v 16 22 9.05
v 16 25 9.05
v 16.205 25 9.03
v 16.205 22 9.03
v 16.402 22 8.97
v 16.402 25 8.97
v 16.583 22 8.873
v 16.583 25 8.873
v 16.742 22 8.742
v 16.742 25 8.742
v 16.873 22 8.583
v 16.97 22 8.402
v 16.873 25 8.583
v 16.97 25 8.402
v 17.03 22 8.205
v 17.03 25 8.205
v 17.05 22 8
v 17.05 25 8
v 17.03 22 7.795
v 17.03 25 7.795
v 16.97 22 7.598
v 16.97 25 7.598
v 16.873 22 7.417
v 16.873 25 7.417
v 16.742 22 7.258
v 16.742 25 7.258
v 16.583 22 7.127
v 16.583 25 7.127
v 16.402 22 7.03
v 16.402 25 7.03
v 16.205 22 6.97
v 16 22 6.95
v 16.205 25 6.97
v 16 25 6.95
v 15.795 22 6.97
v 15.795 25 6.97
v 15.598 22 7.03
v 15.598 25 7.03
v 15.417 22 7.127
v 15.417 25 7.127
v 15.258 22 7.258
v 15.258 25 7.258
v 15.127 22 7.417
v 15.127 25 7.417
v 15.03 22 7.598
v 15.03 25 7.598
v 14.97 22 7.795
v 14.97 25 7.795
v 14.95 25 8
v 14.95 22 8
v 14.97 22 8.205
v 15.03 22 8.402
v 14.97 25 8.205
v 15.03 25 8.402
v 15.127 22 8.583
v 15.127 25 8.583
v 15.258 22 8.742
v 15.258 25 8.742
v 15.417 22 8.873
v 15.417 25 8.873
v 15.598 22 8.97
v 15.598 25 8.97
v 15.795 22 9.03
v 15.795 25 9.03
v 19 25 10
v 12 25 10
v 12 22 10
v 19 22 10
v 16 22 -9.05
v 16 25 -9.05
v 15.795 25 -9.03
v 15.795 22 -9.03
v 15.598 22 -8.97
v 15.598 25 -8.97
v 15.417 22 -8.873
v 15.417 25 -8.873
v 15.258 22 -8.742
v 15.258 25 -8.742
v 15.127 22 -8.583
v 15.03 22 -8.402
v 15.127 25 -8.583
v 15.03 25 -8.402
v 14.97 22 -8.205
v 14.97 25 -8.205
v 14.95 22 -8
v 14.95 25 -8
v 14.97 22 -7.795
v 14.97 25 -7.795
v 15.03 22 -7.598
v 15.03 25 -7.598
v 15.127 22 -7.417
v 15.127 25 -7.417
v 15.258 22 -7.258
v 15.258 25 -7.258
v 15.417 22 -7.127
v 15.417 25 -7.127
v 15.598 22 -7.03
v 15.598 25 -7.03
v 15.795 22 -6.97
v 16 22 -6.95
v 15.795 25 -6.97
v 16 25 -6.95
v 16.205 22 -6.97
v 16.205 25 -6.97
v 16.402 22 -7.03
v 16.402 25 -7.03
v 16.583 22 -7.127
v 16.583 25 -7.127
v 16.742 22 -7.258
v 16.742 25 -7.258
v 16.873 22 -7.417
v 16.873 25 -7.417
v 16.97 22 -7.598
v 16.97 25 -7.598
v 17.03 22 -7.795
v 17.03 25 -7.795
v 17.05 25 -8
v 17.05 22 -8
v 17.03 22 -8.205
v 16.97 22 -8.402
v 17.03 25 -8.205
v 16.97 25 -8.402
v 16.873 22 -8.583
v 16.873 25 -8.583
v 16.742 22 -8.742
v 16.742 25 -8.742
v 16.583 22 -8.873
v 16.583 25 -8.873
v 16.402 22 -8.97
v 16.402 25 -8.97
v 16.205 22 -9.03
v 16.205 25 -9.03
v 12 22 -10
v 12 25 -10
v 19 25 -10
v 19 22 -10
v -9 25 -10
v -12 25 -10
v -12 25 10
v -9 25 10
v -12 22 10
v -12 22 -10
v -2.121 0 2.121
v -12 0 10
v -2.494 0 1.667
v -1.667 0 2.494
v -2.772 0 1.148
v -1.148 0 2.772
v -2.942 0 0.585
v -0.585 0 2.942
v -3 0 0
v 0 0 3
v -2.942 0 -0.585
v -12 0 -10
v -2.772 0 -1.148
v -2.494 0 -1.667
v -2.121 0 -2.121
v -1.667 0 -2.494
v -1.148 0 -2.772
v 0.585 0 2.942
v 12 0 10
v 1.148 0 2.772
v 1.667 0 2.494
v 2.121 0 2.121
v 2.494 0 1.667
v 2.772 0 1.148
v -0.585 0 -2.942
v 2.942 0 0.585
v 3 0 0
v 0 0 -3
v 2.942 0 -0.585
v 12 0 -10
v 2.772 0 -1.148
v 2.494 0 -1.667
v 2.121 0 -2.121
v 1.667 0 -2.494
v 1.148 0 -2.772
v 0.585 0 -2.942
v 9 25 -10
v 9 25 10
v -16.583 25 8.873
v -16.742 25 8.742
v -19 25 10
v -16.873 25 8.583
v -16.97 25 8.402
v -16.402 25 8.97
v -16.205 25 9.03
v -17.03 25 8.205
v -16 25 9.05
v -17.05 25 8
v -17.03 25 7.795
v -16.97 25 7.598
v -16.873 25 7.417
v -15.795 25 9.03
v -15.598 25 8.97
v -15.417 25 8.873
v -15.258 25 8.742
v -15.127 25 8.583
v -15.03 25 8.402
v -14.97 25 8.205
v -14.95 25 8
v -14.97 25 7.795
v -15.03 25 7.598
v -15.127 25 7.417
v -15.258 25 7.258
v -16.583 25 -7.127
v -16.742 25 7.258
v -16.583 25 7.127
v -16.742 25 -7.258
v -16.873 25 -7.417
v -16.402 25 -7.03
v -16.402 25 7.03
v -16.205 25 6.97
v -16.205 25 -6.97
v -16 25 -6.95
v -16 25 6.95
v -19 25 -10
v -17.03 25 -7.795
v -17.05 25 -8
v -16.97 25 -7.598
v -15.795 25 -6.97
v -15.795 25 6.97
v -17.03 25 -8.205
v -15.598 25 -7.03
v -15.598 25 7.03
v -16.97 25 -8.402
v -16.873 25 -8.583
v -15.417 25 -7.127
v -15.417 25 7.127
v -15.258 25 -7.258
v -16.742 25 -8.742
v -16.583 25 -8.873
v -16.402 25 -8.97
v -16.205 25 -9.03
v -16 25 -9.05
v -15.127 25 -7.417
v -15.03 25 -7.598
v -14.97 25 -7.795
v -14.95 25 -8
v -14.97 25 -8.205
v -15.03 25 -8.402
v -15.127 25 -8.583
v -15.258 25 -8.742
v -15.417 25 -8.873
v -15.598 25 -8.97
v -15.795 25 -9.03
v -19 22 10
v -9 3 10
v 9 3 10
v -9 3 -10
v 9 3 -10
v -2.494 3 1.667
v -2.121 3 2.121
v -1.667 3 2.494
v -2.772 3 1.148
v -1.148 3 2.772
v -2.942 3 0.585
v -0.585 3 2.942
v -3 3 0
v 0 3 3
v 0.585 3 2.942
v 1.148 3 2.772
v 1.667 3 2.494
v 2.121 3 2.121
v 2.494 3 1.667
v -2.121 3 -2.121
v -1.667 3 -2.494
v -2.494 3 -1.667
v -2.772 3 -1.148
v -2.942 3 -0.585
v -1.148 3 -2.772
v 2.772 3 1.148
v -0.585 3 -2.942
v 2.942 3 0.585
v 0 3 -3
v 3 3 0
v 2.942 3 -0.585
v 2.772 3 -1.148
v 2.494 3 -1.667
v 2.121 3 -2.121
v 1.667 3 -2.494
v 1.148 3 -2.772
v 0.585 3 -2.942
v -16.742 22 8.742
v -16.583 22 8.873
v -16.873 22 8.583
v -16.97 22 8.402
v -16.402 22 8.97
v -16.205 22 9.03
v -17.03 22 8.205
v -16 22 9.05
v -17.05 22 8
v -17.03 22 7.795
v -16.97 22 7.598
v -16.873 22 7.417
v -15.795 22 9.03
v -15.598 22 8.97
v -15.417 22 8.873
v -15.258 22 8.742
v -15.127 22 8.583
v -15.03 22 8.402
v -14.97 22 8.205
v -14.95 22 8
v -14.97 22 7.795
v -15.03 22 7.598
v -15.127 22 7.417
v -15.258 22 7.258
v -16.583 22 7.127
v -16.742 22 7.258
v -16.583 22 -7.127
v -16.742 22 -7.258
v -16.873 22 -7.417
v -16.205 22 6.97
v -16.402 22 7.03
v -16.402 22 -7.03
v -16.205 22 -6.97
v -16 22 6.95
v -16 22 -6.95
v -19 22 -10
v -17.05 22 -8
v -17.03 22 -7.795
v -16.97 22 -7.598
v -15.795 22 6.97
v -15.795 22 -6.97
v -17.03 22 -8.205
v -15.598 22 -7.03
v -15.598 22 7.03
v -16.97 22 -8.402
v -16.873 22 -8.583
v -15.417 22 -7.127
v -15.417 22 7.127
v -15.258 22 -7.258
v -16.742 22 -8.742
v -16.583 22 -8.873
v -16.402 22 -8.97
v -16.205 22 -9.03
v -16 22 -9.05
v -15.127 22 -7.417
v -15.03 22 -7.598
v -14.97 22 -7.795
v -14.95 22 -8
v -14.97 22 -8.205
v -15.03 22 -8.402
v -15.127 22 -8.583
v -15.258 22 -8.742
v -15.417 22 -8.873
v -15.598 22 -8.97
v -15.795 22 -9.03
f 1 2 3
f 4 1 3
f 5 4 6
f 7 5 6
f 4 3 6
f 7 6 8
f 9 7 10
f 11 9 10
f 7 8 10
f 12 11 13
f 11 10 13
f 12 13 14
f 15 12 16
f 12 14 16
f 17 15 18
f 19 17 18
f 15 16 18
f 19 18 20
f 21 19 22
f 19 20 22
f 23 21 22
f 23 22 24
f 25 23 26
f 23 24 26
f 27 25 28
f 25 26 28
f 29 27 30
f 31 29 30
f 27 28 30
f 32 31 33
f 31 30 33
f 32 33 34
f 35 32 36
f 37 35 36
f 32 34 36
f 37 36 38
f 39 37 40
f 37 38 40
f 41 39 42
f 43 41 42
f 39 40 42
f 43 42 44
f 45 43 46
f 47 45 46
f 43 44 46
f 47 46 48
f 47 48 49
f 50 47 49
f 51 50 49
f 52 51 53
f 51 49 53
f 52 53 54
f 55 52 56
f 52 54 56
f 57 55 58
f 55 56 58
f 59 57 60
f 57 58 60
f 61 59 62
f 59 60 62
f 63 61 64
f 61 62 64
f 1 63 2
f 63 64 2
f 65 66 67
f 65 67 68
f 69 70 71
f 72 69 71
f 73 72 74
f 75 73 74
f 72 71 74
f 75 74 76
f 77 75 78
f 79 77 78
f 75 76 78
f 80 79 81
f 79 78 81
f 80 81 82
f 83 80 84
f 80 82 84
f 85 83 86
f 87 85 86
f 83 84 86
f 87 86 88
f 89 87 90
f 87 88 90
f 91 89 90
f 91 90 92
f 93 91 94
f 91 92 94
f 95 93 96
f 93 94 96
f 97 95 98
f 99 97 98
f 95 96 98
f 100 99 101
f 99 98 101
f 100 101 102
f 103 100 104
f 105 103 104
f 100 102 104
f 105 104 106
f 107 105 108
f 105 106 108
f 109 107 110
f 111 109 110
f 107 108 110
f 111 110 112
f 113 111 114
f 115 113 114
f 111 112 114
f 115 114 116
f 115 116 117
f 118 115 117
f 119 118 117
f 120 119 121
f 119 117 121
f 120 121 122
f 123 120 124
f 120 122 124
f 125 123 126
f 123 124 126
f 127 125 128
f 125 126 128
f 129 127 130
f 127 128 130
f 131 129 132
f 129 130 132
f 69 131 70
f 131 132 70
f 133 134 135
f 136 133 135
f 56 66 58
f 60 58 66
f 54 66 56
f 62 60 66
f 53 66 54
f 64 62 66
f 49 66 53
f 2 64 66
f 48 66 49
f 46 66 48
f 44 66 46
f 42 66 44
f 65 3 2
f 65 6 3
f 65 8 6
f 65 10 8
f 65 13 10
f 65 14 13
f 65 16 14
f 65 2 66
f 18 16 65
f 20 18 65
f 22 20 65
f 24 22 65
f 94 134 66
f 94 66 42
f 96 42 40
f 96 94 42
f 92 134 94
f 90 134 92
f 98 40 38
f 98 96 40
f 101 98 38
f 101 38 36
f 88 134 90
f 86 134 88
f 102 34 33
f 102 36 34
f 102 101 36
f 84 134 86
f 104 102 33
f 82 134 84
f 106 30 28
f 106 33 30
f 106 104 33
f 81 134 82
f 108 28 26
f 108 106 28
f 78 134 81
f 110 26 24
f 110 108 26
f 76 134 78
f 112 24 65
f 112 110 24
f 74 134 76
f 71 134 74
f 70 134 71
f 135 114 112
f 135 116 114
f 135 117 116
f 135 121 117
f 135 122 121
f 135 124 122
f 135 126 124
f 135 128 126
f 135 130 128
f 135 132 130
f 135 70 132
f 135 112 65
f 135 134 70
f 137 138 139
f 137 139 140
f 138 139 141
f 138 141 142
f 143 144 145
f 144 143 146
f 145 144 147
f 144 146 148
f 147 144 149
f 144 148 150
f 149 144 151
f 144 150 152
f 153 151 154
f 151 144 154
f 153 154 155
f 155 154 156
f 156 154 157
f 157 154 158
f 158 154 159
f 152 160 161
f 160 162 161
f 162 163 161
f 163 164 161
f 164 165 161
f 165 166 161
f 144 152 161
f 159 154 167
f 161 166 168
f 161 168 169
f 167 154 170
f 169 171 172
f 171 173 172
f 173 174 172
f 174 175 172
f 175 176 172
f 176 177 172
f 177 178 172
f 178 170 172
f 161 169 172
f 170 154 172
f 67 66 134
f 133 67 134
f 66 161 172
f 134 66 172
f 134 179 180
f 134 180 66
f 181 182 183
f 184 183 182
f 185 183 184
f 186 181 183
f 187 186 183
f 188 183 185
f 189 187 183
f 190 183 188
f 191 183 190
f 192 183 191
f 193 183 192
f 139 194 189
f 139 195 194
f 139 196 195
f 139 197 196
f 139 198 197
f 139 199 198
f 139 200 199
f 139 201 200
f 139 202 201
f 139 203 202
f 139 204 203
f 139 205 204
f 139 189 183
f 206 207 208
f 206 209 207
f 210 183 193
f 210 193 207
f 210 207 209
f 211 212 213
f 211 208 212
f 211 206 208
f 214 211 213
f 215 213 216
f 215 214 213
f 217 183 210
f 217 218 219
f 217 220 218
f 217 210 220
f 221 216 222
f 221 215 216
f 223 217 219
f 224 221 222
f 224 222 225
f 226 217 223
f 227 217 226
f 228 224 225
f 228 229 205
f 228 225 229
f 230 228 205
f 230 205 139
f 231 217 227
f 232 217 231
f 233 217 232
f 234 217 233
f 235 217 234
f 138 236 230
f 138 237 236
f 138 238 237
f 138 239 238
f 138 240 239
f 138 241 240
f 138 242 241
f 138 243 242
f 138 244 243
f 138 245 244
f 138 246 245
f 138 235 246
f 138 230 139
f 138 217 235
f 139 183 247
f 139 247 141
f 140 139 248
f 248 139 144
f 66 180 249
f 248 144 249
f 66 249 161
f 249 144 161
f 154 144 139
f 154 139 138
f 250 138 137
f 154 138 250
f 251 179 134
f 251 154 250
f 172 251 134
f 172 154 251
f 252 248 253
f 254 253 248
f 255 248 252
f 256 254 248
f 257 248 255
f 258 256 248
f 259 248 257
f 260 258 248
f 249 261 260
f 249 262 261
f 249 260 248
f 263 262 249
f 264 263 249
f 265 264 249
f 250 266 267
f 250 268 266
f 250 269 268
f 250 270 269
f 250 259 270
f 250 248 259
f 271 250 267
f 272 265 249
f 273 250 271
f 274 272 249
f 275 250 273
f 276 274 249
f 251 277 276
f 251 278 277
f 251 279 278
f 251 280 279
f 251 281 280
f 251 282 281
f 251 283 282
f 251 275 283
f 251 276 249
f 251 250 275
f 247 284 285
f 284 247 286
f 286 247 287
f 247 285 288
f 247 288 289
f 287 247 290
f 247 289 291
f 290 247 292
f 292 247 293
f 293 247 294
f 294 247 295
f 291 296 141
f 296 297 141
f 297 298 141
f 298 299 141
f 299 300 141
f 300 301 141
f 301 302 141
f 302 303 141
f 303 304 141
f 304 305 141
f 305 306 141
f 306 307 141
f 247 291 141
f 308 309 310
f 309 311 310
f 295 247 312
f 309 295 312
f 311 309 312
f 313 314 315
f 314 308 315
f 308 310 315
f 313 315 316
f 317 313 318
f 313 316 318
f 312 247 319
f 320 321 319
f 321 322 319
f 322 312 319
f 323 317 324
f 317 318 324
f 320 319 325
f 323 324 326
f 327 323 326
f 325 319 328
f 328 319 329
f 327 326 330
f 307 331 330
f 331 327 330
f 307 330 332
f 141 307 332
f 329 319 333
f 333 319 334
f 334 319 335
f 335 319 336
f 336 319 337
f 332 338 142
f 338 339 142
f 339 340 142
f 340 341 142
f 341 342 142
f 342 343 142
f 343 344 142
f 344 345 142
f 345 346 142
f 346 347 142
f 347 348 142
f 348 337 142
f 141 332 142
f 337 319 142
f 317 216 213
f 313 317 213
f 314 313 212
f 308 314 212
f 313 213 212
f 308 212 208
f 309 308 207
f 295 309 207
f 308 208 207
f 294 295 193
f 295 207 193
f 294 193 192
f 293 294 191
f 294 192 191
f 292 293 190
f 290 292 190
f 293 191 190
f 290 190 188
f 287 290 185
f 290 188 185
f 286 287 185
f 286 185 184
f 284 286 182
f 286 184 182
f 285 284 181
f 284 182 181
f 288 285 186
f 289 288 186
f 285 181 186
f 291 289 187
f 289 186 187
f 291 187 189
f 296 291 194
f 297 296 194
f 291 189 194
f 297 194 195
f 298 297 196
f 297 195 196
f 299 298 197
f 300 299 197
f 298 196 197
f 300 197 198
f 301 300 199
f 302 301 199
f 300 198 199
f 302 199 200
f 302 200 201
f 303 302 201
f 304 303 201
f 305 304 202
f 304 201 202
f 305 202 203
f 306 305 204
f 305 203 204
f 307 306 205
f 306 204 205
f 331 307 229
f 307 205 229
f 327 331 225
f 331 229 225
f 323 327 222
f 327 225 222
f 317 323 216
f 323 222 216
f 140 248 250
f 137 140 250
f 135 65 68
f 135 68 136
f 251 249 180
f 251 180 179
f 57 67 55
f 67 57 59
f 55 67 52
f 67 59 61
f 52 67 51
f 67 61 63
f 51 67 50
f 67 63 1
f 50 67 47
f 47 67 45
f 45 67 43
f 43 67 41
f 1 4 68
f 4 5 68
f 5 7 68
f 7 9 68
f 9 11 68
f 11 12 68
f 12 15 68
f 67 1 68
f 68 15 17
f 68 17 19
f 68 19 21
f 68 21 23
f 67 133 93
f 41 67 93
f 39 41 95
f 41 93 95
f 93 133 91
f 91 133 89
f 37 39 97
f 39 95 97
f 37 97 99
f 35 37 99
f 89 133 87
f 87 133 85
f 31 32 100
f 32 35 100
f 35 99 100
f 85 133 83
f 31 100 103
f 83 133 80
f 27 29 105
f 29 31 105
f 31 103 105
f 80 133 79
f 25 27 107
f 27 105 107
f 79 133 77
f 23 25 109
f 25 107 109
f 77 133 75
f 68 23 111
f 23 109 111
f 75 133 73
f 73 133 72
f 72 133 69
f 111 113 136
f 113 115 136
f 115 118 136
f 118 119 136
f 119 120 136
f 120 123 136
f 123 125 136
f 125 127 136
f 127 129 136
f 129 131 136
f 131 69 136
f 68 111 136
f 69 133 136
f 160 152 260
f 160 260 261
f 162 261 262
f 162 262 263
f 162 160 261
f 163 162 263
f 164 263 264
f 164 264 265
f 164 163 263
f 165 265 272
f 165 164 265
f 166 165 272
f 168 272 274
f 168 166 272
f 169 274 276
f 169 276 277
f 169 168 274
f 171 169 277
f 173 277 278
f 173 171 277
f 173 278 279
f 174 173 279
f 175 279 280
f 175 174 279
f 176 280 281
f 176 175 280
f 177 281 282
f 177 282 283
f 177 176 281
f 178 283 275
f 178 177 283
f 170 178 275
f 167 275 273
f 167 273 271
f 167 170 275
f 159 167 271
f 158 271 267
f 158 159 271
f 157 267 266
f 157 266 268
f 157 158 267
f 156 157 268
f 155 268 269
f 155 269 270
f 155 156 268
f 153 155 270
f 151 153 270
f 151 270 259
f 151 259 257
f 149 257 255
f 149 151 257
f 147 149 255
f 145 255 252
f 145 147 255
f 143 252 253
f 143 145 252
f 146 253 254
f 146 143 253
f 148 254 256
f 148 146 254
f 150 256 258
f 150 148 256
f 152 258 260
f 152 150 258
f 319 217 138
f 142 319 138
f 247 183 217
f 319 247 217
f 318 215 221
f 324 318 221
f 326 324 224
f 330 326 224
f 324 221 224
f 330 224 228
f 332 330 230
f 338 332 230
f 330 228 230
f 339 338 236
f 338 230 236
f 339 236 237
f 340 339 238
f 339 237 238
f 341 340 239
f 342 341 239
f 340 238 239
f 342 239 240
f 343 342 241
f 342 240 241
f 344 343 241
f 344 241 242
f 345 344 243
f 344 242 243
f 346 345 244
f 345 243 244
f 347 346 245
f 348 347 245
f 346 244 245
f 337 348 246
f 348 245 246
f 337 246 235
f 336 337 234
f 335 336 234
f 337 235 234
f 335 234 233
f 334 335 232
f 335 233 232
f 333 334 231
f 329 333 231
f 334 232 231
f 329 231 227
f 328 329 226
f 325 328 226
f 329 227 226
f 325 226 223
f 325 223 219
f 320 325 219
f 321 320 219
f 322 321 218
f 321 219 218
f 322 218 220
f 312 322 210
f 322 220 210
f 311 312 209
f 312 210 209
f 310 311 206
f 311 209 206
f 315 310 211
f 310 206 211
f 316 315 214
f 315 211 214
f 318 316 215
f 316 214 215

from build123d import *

# Parameters (mm, degrees)
SKETCH_1_W        = 18
SKETCH_1_H        = 20
SKETCH_1_R        = 3
EXTRUDE_2_DEPTH   = 3
SKETCH_1_3_W      = 3
SKETCH_1_3_H      = 20
EXTRUDE_3_DEPTH   = 25
SKETCH_2_W        = 7
SKETCH_2_H        = 20
SKETCH_2_R        = 1.05
EXTRUDE_4_DEPTH   = 3
EXTRUDE_4_2_DEPTH = 3


with BuildPart() as part:
    # 草圖1 → 填料-伸長2 (new body)
    with BuildSketch(Plane(origin=(0, 0, 0), x_dir=(1, 0, 0), z_dir=(0, 1, 0))):
        Rectangle(SKETCH_1_W, SKETCH_1_H)
        Circle(SKETCH_1_R, mode=Mode.SUBTRACT)
    extrude(amount=EXTRUDE_2_DEPTH)

    # 草圖1<3> → 填料-伸長3 (add)
    with BuildSketch(Plane(origin=(0, 0, 0), x_dir=(1, 0, 0), z_dir=(0, 1, 0))):
        with Locations((-10.5, 0)):
            Rectangle(SKETCH_1_3_W, SKETCH_1_3_H)
        with Locations((10.5, 0)):
            Rectangle(SKETCH_1_3_W, SKETCH_1_3_H)
    extrude(amount=EXTRUDE_3_DEPTH)


with BuildPart() as body_2:
    # 草圖2 → 填料-伸長4 (new body)
    with BuildSketch(Plane(origin=(0, 25, 0), x_dir=(1, 0, 0), z_dir=(0, 1, 0))):
        with Locations((-15.5, 0)):
            Rectangle(SKETCH_2_W, SKETCH_2_H)
        with Locations((-16, 8)):
            Circle(SKETCH_2_R, mode=Mode.SUBTRACT)
        with Locations((-16, -8)):
            Circle(SKETCH_2_R, mode=Mode.SUBTRACT)
    extrude(amount=-EXTRUDE_4_DEPTH)


with BuildPart() as body_3:
    # 草圖2 → Extrude 4 2 (new body)
    with BuildSketch(Plane(origin=(0, 25, 0), x_dir=(1, 0, 0), z_dir=(0, 1, 0))):
        with Locations((15.5, 0)):
            Rectangle(SKETCH_2_W, SKETCH_2_H)
        with Locations((16, 8)):
            Circle(SKETCH_2_R, mode=Mode.SUBTRACT)
        with Locations((16, -8)):
            Circle(SKETCH_2_R, mode=Mode.SUBTRACT)
    extrude(amount=-EXTRUDE_4_2_DEPTH)


solid = Compound([part.part, body_2.part, body_3.part])
